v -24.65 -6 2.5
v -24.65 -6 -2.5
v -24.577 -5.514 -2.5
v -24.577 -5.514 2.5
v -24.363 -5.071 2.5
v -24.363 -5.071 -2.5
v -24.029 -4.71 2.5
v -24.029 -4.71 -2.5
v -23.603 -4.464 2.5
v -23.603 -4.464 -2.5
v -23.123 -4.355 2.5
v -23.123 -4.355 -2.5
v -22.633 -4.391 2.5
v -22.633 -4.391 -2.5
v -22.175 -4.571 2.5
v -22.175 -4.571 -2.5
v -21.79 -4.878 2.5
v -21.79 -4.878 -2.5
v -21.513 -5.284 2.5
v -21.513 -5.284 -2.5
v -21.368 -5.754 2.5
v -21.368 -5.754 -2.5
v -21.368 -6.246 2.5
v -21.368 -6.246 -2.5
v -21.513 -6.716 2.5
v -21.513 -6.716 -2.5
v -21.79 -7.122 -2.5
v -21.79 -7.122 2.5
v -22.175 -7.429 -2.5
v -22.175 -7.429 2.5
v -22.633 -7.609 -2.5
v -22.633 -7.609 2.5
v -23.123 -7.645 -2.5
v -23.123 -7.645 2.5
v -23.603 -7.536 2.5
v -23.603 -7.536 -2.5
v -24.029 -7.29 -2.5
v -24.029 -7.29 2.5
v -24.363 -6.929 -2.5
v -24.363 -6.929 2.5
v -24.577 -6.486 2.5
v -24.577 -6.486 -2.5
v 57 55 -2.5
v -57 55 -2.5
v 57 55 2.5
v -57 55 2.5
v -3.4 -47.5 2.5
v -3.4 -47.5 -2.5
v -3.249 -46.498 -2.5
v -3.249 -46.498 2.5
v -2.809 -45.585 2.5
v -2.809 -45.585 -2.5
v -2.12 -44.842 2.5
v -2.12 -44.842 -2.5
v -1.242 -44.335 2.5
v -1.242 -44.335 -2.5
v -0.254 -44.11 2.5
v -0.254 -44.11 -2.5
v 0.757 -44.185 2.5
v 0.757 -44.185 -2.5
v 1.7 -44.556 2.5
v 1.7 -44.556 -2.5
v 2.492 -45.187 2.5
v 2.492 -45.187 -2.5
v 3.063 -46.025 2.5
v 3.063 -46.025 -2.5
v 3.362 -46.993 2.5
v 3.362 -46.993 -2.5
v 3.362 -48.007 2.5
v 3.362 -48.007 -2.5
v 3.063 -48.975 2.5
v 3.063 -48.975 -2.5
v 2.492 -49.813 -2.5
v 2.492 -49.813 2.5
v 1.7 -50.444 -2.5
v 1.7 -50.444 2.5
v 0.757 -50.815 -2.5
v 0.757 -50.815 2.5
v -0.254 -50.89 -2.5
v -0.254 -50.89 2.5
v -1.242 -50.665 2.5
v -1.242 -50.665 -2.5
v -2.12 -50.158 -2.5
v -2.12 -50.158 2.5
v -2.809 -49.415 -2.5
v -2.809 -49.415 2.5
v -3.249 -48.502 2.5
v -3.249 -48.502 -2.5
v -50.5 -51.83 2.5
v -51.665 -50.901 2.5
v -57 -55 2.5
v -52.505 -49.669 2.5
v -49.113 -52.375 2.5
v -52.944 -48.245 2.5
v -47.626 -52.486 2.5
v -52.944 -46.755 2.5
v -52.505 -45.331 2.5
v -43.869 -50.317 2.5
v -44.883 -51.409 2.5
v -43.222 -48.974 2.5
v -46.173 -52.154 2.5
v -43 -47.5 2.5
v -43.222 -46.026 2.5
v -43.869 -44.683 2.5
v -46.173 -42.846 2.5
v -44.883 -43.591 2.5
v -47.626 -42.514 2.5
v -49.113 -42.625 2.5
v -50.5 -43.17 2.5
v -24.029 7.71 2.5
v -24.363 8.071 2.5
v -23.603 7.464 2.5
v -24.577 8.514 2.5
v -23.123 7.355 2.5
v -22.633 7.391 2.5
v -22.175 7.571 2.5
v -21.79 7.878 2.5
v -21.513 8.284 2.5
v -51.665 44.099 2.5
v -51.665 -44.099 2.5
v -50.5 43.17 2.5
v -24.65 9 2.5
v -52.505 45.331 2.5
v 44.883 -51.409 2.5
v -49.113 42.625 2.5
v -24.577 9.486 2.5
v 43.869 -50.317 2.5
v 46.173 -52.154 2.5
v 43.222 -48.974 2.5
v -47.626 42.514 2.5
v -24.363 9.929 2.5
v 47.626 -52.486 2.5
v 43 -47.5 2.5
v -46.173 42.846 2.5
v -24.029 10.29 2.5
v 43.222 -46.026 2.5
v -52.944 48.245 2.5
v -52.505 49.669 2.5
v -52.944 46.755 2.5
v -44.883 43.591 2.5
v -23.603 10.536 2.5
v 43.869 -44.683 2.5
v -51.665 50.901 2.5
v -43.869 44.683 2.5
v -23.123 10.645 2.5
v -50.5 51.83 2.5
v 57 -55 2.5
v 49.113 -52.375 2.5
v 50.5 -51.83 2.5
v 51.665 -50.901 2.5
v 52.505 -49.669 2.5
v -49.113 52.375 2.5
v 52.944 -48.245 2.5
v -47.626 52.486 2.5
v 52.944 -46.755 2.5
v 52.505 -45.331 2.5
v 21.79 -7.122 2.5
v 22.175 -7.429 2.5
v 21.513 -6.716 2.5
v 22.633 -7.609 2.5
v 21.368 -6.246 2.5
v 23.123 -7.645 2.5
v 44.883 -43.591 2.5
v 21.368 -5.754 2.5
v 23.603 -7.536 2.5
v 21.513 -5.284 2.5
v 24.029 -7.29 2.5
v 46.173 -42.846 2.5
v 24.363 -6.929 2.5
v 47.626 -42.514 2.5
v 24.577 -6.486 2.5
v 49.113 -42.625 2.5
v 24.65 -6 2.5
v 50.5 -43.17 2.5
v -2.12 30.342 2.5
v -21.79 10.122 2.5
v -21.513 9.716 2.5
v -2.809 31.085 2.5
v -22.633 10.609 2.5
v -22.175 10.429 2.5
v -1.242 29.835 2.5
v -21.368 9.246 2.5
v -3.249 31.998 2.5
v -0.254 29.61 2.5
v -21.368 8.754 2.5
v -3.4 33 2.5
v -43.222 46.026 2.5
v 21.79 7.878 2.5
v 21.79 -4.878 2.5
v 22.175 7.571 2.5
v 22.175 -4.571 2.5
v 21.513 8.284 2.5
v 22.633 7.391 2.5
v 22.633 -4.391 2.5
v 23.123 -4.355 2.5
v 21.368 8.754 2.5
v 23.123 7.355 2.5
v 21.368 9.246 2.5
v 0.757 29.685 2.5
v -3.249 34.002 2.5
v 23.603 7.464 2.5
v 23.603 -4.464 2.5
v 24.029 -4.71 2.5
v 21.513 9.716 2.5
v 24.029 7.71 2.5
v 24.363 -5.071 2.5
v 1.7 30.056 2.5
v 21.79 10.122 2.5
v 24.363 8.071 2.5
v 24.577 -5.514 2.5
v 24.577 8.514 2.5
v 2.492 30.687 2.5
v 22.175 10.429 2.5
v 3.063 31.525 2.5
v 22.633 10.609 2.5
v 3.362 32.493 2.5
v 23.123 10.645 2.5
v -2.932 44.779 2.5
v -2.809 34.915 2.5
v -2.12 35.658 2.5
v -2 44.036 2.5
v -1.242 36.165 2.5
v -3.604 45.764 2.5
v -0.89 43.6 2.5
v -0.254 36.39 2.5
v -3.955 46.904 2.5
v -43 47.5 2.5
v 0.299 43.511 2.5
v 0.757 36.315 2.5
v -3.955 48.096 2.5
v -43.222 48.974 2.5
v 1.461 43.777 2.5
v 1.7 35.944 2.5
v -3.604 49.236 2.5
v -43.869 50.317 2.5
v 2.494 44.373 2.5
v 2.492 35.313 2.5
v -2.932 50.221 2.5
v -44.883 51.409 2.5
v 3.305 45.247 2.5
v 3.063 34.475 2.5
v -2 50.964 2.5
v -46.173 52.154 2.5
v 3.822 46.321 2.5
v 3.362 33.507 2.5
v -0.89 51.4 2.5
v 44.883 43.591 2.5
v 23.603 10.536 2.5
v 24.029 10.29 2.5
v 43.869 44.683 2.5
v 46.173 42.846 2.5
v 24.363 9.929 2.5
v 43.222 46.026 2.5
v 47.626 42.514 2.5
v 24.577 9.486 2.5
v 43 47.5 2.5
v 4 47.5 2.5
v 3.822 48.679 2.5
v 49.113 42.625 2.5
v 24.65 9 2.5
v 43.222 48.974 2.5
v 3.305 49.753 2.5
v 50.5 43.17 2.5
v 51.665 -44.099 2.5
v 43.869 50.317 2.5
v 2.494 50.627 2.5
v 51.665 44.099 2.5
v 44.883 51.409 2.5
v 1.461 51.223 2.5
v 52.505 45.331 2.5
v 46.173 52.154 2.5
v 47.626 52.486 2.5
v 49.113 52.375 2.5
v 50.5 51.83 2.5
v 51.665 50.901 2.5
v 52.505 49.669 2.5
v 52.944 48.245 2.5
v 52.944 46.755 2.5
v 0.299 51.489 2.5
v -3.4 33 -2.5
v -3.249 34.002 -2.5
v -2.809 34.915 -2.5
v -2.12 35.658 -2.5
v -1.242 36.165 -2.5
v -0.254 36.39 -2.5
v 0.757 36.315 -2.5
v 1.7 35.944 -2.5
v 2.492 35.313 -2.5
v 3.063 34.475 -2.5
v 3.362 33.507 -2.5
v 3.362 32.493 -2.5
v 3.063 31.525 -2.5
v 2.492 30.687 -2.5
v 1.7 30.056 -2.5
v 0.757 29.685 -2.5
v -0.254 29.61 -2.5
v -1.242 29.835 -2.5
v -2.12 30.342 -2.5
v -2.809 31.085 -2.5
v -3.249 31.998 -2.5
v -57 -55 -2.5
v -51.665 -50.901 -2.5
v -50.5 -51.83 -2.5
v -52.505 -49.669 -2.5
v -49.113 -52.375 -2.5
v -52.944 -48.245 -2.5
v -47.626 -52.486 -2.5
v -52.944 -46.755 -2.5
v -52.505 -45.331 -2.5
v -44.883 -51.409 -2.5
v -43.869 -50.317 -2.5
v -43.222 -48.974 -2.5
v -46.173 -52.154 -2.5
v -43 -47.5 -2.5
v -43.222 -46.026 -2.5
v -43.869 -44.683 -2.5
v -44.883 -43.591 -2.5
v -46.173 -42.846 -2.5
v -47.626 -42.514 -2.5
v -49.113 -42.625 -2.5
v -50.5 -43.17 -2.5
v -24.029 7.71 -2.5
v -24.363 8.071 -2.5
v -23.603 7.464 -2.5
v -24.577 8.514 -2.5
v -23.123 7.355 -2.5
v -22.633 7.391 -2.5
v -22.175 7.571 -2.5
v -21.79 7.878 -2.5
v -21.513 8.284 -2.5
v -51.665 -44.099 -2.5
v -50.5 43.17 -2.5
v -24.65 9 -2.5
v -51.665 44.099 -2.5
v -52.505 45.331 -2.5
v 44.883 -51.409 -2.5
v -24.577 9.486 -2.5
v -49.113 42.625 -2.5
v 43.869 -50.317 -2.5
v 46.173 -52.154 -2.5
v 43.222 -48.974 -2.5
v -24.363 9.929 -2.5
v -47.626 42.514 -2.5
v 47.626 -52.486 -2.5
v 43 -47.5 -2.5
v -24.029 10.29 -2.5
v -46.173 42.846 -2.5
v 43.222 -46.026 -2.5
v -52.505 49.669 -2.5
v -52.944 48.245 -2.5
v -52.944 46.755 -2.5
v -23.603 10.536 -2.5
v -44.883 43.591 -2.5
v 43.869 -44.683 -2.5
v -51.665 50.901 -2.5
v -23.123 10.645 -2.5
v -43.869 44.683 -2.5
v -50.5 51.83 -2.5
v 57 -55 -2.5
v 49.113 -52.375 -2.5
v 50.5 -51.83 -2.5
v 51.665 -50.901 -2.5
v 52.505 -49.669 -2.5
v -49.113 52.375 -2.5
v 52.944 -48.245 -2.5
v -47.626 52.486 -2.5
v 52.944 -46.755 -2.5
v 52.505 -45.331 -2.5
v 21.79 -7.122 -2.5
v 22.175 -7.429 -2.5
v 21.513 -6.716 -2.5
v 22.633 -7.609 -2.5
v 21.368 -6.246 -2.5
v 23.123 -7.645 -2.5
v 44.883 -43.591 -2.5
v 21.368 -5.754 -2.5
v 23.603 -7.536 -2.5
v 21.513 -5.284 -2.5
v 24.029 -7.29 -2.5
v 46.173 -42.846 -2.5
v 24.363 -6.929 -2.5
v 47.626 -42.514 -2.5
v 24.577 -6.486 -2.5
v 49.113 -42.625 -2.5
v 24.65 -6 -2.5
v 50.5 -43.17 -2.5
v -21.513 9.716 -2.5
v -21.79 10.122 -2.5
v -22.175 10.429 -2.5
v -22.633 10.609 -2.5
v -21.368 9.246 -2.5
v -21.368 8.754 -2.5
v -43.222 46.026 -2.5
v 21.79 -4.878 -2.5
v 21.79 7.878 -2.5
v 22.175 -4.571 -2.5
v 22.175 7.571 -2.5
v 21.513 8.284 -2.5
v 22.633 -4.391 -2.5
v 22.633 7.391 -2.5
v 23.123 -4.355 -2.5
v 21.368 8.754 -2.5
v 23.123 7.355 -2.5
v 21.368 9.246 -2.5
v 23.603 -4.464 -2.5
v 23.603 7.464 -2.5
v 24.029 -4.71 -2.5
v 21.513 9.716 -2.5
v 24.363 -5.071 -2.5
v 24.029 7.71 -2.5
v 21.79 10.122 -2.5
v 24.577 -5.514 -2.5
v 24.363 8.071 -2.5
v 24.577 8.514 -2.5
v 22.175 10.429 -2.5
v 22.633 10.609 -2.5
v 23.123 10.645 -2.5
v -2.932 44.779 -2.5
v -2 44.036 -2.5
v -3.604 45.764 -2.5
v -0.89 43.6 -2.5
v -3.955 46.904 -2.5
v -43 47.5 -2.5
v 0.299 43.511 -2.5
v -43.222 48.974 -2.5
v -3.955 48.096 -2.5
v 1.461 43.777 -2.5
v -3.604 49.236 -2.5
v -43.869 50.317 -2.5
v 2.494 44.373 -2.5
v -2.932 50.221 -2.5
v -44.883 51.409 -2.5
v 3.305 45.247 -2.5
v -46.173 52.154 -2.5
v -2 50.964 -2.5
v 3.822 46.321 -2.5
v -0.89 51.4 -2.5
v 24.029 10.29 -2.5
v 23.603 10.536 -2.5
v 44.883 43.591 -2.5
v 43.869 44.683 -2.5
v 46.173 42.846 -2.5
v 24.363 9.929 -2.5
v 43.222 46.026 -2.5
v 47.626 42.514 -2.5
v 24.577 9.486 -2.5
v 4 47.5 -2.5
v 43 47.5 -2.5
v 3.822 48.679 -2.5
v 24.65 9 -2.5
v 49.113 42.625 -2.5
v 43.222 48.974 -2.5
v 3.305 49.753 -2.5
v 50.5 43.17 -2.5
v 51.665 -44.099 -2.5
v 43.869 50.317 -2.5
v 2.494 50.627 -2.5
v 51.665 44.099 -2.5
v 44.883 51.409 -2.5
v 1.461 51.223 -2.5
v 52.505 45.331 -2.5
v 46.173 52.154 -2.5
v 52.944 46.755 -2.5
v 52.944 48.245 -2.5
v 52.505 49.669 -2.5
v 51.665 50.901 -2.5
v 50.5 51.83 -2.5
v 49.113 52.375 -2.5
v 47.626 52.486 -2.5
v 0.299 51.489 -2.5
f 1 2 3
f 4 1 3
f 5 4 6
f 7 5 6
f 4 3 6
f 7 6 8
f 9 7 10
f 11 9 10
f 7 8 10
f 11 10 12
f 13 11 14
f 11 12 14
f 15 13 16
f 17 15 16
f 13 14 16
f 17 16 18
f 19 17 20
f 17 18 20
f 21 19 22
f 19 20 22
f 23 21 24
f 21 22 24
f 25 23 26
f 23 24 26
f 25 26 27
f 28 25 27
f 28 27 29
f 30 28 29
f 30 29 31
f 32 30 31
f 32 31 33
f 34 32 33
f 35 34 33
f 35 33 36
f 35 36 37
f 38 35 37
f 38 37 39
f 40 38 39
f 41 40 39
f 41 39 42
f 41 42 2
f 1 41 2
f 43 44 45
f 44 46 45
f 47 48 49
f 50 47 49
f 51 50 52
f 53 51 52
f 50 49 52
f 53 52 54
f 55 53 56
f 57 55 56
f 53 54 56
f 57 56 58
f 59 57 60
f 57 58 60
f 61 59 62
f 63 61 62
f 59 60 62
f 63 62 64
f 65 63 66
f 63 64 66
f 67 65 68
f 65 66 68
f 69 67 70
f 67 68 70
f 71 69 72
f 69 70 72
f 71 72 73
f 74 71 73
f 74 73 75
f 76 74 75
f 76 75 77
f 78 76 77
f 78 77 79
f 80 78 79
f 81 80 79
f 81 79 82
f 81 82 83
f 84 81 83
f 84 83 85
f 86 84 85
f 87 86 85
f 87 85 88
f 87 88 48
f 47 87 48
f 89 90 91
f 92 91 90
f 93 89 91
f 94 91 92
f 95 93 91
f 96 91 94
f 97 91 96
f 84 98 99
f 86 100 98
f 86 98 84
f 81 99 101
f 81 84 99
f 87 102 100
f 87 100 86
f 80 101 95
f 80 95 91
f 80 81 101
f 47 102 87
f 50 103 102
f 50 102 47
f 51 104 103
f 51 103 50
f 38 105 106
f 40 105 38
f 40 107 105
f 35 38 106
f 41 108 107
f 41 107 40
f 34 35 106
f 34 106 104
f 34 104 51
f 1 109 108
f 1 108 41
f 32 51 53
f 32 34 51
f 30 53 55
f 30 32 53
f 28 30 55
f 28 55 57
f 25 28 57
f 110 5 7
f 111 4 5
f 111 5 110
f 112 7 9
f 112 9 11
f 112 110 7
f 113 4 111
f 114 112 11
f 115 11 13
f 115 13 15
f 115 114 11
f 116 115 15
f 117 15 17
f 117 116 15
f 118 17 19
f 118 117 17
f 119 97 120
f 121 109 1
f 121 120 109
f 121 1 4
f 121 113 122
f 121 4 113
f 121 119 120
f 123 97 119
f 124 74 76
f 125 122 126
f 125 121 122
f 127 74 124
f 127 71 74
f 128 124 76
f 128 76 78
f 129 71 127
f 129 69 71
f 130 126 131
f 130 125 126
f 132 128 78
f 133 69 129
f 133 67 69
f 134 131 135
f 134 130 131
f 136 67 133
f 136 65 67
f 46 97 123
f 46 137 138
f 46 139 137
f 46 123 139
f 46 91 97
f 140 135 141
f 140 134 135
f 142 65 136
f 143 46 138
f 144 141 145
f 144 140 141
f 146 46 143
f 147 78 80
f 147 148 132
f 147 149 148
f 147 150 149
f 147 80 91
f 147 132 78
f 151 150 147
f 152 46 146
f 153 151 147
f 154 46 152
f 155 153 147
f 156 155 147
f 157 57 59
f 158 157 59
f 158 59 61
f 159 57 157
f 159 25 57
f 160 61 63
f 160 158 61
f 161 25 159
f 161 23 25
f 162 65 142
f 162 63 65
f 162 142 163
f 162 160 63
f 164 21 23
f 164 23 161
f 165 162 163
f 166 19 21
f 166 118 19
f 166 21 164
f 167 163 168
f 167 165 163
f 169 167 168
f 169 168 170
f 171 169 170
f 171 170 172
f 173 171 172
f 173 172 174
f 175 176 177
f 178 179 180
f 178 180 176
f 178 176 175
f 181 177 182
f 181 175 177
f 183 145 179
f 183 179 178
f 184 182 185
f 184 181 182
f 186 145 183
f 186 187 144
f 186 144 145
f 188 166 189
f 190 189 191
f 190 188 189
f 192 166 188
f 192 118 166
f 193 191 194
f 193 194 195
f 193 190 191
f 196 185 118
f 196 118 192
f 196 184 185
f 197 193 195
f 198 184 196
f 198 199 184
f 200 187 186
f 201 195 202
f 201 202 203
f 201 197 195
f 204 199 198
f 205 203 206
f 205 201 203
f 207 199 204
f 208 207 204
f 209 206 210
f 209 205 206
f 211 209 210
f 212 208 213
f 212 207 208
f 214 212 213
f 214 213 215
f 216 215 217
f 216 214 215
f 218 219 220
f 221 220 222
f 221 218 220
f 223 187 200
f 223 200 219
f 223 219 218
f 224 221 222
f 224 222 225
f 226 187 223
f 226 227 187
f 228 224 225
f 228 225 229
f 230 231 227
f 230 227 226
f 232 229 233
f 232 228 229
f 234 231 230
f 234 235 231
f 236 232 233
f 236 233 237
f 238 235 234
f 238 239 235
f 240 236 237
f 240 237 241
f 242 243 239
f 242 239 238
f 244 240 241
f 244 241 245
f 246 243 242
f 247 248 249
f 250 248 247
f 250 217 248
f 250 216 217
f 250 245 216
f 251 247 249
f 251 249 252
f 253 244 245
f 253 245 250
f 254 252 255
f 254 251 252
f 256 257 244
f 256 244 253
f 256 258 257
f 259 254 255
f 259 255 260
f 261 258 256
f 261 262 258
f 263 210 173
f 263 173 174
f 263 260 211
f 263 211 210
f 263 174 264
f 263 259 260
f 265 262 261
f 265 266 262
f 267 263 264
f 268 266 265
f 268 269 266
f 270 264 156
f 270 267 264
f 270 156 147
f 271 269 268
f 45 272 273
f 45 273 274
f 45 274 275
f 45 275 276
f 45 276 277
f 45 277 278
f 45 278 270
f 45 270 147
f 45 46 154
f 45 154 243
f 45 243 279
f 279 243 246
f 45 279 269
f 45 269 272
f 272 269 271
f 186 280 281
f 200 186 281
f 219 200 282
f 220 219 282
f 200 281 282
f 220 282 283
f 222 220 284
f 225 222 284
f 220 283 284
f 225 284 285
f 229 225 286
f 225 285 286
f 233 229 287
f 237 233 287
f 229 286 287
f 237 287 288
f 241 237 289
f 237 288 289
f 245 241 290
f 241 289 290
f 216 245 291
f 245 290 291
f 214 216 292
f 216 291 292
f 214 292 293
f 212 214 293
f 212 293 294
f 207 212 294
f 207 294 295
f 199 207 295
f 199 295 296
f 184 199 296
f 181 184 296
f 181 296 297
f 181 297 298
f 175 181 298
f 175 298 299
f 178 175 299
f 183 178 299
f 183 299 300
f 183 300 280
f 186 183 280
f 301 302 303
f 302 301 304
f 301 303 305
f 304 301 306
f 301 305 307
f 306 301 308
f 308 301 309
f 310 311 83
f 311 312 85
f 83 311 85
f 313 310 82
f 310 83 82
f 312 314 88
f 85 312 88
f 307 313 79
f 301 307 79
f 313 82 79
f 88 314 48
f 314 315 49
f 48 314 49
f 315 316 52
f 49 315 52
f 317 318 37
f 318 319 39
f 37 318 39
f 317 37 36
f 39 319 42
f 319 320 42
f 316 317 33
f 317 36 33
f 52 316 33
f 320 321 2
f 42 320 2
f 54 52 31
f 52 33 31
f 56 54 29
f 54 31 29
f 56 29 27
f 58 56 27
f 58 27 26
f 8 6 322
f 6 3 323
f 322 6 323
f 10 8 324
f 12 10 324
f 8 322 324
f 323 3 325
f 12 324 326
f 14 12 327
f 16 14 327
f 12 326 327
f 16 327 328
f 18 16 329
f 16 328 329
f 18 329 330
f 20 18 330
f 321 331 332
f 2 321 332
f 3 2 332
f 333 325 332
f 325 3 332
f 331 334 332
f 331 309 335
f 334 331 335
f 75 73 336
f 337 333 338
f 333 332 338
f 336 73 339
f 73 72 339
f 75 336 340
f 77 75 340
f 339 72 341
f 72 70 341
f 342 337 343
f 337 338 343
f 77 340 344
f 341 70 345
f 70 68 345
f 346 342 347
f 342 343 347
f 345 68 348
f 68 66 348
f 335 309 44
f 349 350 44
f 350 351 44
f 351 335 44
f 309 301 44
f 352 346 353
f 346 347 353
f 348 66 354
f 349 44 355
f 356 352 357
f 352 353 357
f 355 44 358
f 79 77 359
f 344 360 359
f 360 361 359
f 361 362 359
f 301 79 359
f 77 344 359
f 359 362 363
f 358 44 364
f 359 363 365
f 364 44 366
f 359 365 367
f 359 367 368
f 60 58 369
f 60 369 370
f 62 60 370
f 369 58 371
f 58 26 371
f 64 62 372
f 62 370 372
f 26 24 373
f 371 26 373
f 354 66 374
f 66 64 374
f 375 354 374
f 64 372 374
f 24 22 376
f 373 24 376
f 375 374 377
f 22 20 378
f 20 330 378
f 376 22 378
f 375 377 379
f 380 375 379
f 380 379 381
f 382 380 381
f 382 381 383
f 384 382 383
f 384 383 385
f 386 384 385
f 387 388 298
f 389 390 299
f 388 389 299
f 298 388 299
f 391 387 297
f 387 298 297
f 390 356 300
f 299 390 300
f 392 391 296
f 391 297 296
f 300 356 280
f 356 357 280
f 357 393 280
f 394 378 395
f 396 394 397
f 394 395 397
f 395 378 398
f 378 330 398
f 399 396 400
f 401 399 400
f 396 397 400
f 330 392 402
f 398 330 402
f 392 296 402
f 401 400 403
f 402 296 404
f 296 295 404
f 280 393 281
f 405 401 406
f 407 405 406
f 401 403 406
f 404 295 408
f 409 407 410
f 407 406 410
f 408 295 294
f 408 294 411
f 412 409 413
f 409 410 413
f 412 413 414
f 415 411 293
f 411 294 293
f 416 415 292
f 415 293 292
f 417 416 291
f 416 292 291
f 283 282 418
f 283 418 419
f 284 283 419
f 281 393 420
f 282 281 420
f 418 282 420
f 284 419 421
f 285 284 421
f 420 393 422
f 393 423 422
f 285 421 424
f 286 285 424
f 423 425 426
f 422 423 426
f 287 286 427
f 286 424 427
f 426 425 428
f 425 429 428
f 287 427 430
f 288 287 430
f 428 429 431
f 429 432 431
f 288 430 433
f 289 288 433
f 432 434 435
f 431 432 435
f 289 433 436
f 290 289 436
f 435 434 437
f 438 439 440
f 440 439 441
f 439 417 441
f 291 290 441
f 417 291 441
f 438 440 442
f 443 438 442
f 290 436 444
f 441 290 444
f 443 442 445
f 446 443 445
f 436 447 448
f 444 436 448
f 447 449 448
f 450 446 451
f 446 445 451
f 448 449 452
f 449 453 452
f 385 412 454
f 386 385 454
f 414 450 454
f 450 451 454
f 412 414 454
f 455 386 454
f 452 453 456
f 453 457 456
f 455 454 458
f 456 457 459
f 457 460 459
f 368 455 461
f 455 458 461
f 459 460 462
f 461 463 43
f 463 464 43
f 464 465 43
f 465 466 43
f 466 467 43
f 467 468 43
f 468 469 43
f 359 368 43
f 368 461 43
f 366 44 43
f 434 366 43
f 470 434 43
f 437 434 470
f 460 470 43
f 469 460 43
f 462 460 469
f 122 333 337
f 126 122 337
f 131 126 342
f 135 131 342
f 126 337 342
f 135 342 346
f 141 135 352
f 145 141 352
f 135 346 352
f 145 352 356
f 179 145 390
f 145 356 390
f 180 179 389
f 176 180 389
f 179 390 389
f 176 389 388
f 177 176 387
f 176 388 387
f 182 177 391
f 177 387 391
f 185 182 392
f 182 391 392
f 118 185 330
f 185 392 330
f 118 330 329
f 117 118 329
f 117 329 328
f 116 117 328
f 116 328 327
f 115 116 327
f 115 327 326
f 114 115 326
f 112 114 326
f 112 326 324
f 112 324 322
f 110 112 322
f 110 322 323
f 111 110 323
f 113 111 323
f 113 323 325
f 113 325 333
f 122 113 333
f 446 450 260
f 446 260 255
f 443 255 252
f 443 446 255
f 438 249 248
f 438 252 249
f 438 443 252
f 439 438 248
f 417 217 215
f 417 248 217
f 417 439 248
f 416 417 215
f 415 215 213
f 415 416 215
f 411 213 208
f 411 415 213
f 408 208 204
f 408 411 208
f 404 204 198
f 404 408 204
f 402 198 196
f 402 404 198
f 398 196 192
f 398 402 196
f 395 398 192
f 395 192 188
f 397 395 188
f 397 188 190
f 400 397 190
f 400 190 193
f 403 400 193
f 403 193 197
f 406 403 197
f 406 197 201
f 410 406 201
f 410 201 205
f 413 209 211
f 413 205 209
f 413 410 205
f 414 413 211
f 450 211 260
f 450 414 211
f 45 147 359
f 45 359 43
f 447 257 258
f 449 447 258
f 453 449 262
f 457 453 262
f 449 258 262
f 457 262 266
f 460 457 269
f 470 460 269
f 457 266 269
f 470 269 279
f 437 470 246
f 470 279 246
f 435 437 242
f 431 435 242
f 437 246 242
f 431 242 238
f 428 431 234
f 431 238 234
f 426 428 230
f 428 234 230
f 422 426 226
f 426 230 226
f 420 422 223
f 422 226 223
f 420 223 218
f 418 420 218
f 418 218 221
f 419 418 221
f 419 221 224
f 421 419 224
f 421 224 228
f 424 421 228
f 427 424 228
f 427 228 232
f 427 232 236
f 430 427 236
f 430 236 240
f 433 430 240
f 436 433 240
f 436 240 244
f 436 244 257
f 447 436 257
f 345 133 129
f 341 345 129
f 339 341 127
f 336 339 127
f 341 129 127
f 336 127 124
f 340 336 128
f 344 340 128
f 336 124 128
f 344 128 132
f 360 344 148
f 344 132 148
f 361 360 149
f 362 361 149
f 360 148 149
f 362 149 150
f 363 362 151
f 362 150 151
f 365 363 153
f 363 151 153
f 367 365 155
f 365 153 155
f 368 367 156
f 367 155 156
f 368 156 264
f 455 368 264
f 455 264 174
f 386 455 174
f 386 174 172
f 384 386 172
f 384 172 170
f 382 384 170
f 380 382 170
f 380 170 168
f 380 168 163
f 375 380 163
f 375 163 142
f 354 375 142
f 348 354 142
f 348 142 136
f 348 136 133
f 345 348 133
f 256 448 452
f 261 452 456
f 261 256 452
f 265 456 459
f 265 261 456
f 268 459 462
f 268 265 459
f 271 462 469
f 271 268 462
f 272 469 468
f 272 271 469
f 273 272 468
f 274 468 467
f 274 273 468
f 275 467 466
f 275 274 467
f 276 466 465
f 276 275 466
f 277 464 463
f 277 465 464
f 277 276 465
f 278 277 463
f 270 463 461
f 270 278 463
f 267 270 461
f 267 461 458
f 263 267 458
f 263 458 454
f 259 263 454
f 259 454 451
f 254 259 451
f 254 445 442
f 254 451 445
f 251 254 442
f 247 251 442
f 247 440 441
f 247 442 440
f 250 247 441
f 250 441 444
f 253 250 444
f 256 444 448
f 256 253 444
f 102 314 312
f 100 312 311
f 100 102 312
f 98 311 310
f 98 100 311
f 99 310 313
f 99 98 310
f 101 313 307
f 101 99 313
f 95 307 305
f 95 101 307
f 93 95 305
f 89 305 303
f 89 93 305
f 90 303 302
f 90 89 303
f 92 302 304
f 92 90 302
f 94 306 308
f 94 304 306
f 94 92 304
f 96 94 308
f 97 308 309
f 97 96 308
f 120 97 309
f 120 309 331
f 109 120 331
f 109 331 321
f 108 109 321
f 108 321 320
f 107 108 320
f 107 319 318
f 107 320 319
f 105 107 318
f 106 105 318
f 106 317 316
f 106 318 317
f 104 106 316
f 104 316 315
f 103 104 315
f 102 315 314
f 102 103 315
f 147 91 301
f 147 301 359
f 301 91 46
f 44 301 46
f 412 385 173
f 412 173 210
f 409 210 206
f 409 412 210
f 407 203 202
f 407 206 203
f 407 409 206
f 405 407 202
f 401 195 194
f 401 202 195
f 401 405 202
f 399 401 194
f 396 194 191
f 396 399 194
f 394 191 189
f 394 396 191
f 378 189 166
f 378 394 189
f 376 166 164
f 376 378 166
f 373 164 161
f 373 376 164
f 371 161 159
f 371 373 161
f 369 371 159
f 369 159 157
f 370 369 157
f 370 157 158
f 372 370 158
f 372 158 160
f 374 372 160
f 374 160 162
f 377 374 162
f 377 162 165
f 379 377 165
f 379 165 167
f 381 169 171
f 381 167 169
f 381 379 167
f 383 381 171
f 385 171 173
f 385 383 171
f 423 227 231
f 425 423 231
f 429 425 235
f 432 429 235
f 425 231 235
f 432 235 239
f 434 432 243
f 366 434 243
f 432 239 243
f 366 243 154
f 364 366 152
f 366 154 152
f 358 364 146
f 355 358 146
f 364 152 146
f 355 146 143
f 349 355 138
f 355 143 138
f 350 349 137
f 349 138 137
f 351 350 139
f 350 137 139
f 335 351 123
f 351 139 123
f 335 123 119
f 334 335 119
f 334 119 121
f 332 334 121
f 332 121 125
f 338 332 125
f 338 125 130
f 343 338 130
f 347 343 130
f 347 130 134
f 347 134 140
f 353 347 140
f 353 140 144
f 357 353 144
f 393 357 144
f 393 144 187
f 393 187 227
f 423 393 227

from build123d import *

# Parameters (mm, degrees)
SKETCH_1_W               = 114
SKETCH_1_H               = 110
EXTRUDE_2_DEPTH          = 2.5
SKETCH_2_R               = 5
CUT_EXTRUDE_1_DEPTH      = 80.366239674
MIRROR_2_COPY_1_SKETCH_R = 5
MIRROR_2_COPY_1_DEPTH    = 80.366239674
HOLE_WIZARD_M4_1_D       = 3.3
HOLE_WIZARD_M8_3_D       = 6.8
SKETCH_8_R               = 4
CUT_EXTRUDE_2_DEPTH      = 80.366239674
HOLE_WIZARD_M8_4_D       = 6.8


with BuildPart() as part:
    # 草图1 → 凸台-拉伸2 (new, symmetric)
    with BuildSketch(Plane.XY):
        Rectangle(SKETCH_1_W, SKETCH_1_H)
    extrude(amount=EXTRUDE_2_DEPTH, both=True)

    # 草图2 → 切除-拉伸1 (cut, through all)
    with BuildSketch(Plane.XY.offset(2.5)):
        with Locations((-48, 47.5)):
            Circle(SKETCH_2_R)
    cut_extrude_1 = extrude(amount=-CUT_EXTRUDE_1_DEPTH, mode=Mode.SUBTRACT)

    # 镜向1: 切除-拉伸1 across plane
    add(cut_extrude_1.mirror(Plane.ZX), mode=Mode.SUBTRACT)

    # 镜向2: 切除-拉伸1 across plane
    add(cut_extrude_1.mirror(Plane(origin=(0, 0, 0), x_dir=(0, 0, 1), z_dir=(1, 0, 0))), mode=Mode.SUBTRACT)

    # 镜向2 copy 1 sketch → 镜向2 copy 1 (cut, through all)
    with BuildSketch(Plane(origin=(0, 0, 2.5), x_dir=(-1, 0, 0), z_dir=(0, 0, 1))):
        with Locations((-48, 47.5)):
            Circle(MIRROR_2_COPY_1_SKETCH_R)
    extrude(amount=-MIRROR_2_COPY_1_DEPTH, mode=Mode.SUBTRACT)

    # M4 螺纹孔的螺纹孔钻头1 (through all)
    with Locations(Plane(origin=(-23, 9, 2.5), x_dir=(1, 0, 0), z_dir=(0, 0, 1))):
        with Locations((0, 0), (0, -15)):
            hole_wizard_m4_1 = Hole(HOLE_WIZARD_M4_1_D / 2)

    # 镜向4: M4 螺纹孔的螺纹孔钻头1 across plane
    add(hole_wizard_m4_1.mirror(Plane(origin=(0, 0, 0), x_dir=(0, 0, 1), z_dir=(1, 0, 0))), mode=Mode.SUBTRACT)

    # M8 螺纹孔的螺纹孔钻头3 (through all)
    with Locations(Plane(origin=(0, 33, 2.5), x_dir=(1, 0, 0), z_dir=(0, 0, 1))):
        with Locations((0, 0)):
            Hole(HOLE_WIZARD_M8_3_D / 2)

    # 草图8 → 切除-拉伸2 (cut, through all)
    with BuildSketch(Plane.XY.offset(2.5)):
        with Locations((0, 47.5)):
            Circle(SKETCH_8_R)
    extrude(amount=-CUT_EXTRUDE_2_DEPTH, mode=Mode.SUBTRACT)

    # M8 螺纹孔的螺纹孔钻头4 (through all)
    with Locations(Plane(origin=(0, -47.5, 2.5), x_dir=(1, 0, 0), z_dir=(0, 0, 1))):
        with Locations((0, 0)):
            Hole(HOLE_WIZARD_M8_4_D / 2)


solid = part.part
